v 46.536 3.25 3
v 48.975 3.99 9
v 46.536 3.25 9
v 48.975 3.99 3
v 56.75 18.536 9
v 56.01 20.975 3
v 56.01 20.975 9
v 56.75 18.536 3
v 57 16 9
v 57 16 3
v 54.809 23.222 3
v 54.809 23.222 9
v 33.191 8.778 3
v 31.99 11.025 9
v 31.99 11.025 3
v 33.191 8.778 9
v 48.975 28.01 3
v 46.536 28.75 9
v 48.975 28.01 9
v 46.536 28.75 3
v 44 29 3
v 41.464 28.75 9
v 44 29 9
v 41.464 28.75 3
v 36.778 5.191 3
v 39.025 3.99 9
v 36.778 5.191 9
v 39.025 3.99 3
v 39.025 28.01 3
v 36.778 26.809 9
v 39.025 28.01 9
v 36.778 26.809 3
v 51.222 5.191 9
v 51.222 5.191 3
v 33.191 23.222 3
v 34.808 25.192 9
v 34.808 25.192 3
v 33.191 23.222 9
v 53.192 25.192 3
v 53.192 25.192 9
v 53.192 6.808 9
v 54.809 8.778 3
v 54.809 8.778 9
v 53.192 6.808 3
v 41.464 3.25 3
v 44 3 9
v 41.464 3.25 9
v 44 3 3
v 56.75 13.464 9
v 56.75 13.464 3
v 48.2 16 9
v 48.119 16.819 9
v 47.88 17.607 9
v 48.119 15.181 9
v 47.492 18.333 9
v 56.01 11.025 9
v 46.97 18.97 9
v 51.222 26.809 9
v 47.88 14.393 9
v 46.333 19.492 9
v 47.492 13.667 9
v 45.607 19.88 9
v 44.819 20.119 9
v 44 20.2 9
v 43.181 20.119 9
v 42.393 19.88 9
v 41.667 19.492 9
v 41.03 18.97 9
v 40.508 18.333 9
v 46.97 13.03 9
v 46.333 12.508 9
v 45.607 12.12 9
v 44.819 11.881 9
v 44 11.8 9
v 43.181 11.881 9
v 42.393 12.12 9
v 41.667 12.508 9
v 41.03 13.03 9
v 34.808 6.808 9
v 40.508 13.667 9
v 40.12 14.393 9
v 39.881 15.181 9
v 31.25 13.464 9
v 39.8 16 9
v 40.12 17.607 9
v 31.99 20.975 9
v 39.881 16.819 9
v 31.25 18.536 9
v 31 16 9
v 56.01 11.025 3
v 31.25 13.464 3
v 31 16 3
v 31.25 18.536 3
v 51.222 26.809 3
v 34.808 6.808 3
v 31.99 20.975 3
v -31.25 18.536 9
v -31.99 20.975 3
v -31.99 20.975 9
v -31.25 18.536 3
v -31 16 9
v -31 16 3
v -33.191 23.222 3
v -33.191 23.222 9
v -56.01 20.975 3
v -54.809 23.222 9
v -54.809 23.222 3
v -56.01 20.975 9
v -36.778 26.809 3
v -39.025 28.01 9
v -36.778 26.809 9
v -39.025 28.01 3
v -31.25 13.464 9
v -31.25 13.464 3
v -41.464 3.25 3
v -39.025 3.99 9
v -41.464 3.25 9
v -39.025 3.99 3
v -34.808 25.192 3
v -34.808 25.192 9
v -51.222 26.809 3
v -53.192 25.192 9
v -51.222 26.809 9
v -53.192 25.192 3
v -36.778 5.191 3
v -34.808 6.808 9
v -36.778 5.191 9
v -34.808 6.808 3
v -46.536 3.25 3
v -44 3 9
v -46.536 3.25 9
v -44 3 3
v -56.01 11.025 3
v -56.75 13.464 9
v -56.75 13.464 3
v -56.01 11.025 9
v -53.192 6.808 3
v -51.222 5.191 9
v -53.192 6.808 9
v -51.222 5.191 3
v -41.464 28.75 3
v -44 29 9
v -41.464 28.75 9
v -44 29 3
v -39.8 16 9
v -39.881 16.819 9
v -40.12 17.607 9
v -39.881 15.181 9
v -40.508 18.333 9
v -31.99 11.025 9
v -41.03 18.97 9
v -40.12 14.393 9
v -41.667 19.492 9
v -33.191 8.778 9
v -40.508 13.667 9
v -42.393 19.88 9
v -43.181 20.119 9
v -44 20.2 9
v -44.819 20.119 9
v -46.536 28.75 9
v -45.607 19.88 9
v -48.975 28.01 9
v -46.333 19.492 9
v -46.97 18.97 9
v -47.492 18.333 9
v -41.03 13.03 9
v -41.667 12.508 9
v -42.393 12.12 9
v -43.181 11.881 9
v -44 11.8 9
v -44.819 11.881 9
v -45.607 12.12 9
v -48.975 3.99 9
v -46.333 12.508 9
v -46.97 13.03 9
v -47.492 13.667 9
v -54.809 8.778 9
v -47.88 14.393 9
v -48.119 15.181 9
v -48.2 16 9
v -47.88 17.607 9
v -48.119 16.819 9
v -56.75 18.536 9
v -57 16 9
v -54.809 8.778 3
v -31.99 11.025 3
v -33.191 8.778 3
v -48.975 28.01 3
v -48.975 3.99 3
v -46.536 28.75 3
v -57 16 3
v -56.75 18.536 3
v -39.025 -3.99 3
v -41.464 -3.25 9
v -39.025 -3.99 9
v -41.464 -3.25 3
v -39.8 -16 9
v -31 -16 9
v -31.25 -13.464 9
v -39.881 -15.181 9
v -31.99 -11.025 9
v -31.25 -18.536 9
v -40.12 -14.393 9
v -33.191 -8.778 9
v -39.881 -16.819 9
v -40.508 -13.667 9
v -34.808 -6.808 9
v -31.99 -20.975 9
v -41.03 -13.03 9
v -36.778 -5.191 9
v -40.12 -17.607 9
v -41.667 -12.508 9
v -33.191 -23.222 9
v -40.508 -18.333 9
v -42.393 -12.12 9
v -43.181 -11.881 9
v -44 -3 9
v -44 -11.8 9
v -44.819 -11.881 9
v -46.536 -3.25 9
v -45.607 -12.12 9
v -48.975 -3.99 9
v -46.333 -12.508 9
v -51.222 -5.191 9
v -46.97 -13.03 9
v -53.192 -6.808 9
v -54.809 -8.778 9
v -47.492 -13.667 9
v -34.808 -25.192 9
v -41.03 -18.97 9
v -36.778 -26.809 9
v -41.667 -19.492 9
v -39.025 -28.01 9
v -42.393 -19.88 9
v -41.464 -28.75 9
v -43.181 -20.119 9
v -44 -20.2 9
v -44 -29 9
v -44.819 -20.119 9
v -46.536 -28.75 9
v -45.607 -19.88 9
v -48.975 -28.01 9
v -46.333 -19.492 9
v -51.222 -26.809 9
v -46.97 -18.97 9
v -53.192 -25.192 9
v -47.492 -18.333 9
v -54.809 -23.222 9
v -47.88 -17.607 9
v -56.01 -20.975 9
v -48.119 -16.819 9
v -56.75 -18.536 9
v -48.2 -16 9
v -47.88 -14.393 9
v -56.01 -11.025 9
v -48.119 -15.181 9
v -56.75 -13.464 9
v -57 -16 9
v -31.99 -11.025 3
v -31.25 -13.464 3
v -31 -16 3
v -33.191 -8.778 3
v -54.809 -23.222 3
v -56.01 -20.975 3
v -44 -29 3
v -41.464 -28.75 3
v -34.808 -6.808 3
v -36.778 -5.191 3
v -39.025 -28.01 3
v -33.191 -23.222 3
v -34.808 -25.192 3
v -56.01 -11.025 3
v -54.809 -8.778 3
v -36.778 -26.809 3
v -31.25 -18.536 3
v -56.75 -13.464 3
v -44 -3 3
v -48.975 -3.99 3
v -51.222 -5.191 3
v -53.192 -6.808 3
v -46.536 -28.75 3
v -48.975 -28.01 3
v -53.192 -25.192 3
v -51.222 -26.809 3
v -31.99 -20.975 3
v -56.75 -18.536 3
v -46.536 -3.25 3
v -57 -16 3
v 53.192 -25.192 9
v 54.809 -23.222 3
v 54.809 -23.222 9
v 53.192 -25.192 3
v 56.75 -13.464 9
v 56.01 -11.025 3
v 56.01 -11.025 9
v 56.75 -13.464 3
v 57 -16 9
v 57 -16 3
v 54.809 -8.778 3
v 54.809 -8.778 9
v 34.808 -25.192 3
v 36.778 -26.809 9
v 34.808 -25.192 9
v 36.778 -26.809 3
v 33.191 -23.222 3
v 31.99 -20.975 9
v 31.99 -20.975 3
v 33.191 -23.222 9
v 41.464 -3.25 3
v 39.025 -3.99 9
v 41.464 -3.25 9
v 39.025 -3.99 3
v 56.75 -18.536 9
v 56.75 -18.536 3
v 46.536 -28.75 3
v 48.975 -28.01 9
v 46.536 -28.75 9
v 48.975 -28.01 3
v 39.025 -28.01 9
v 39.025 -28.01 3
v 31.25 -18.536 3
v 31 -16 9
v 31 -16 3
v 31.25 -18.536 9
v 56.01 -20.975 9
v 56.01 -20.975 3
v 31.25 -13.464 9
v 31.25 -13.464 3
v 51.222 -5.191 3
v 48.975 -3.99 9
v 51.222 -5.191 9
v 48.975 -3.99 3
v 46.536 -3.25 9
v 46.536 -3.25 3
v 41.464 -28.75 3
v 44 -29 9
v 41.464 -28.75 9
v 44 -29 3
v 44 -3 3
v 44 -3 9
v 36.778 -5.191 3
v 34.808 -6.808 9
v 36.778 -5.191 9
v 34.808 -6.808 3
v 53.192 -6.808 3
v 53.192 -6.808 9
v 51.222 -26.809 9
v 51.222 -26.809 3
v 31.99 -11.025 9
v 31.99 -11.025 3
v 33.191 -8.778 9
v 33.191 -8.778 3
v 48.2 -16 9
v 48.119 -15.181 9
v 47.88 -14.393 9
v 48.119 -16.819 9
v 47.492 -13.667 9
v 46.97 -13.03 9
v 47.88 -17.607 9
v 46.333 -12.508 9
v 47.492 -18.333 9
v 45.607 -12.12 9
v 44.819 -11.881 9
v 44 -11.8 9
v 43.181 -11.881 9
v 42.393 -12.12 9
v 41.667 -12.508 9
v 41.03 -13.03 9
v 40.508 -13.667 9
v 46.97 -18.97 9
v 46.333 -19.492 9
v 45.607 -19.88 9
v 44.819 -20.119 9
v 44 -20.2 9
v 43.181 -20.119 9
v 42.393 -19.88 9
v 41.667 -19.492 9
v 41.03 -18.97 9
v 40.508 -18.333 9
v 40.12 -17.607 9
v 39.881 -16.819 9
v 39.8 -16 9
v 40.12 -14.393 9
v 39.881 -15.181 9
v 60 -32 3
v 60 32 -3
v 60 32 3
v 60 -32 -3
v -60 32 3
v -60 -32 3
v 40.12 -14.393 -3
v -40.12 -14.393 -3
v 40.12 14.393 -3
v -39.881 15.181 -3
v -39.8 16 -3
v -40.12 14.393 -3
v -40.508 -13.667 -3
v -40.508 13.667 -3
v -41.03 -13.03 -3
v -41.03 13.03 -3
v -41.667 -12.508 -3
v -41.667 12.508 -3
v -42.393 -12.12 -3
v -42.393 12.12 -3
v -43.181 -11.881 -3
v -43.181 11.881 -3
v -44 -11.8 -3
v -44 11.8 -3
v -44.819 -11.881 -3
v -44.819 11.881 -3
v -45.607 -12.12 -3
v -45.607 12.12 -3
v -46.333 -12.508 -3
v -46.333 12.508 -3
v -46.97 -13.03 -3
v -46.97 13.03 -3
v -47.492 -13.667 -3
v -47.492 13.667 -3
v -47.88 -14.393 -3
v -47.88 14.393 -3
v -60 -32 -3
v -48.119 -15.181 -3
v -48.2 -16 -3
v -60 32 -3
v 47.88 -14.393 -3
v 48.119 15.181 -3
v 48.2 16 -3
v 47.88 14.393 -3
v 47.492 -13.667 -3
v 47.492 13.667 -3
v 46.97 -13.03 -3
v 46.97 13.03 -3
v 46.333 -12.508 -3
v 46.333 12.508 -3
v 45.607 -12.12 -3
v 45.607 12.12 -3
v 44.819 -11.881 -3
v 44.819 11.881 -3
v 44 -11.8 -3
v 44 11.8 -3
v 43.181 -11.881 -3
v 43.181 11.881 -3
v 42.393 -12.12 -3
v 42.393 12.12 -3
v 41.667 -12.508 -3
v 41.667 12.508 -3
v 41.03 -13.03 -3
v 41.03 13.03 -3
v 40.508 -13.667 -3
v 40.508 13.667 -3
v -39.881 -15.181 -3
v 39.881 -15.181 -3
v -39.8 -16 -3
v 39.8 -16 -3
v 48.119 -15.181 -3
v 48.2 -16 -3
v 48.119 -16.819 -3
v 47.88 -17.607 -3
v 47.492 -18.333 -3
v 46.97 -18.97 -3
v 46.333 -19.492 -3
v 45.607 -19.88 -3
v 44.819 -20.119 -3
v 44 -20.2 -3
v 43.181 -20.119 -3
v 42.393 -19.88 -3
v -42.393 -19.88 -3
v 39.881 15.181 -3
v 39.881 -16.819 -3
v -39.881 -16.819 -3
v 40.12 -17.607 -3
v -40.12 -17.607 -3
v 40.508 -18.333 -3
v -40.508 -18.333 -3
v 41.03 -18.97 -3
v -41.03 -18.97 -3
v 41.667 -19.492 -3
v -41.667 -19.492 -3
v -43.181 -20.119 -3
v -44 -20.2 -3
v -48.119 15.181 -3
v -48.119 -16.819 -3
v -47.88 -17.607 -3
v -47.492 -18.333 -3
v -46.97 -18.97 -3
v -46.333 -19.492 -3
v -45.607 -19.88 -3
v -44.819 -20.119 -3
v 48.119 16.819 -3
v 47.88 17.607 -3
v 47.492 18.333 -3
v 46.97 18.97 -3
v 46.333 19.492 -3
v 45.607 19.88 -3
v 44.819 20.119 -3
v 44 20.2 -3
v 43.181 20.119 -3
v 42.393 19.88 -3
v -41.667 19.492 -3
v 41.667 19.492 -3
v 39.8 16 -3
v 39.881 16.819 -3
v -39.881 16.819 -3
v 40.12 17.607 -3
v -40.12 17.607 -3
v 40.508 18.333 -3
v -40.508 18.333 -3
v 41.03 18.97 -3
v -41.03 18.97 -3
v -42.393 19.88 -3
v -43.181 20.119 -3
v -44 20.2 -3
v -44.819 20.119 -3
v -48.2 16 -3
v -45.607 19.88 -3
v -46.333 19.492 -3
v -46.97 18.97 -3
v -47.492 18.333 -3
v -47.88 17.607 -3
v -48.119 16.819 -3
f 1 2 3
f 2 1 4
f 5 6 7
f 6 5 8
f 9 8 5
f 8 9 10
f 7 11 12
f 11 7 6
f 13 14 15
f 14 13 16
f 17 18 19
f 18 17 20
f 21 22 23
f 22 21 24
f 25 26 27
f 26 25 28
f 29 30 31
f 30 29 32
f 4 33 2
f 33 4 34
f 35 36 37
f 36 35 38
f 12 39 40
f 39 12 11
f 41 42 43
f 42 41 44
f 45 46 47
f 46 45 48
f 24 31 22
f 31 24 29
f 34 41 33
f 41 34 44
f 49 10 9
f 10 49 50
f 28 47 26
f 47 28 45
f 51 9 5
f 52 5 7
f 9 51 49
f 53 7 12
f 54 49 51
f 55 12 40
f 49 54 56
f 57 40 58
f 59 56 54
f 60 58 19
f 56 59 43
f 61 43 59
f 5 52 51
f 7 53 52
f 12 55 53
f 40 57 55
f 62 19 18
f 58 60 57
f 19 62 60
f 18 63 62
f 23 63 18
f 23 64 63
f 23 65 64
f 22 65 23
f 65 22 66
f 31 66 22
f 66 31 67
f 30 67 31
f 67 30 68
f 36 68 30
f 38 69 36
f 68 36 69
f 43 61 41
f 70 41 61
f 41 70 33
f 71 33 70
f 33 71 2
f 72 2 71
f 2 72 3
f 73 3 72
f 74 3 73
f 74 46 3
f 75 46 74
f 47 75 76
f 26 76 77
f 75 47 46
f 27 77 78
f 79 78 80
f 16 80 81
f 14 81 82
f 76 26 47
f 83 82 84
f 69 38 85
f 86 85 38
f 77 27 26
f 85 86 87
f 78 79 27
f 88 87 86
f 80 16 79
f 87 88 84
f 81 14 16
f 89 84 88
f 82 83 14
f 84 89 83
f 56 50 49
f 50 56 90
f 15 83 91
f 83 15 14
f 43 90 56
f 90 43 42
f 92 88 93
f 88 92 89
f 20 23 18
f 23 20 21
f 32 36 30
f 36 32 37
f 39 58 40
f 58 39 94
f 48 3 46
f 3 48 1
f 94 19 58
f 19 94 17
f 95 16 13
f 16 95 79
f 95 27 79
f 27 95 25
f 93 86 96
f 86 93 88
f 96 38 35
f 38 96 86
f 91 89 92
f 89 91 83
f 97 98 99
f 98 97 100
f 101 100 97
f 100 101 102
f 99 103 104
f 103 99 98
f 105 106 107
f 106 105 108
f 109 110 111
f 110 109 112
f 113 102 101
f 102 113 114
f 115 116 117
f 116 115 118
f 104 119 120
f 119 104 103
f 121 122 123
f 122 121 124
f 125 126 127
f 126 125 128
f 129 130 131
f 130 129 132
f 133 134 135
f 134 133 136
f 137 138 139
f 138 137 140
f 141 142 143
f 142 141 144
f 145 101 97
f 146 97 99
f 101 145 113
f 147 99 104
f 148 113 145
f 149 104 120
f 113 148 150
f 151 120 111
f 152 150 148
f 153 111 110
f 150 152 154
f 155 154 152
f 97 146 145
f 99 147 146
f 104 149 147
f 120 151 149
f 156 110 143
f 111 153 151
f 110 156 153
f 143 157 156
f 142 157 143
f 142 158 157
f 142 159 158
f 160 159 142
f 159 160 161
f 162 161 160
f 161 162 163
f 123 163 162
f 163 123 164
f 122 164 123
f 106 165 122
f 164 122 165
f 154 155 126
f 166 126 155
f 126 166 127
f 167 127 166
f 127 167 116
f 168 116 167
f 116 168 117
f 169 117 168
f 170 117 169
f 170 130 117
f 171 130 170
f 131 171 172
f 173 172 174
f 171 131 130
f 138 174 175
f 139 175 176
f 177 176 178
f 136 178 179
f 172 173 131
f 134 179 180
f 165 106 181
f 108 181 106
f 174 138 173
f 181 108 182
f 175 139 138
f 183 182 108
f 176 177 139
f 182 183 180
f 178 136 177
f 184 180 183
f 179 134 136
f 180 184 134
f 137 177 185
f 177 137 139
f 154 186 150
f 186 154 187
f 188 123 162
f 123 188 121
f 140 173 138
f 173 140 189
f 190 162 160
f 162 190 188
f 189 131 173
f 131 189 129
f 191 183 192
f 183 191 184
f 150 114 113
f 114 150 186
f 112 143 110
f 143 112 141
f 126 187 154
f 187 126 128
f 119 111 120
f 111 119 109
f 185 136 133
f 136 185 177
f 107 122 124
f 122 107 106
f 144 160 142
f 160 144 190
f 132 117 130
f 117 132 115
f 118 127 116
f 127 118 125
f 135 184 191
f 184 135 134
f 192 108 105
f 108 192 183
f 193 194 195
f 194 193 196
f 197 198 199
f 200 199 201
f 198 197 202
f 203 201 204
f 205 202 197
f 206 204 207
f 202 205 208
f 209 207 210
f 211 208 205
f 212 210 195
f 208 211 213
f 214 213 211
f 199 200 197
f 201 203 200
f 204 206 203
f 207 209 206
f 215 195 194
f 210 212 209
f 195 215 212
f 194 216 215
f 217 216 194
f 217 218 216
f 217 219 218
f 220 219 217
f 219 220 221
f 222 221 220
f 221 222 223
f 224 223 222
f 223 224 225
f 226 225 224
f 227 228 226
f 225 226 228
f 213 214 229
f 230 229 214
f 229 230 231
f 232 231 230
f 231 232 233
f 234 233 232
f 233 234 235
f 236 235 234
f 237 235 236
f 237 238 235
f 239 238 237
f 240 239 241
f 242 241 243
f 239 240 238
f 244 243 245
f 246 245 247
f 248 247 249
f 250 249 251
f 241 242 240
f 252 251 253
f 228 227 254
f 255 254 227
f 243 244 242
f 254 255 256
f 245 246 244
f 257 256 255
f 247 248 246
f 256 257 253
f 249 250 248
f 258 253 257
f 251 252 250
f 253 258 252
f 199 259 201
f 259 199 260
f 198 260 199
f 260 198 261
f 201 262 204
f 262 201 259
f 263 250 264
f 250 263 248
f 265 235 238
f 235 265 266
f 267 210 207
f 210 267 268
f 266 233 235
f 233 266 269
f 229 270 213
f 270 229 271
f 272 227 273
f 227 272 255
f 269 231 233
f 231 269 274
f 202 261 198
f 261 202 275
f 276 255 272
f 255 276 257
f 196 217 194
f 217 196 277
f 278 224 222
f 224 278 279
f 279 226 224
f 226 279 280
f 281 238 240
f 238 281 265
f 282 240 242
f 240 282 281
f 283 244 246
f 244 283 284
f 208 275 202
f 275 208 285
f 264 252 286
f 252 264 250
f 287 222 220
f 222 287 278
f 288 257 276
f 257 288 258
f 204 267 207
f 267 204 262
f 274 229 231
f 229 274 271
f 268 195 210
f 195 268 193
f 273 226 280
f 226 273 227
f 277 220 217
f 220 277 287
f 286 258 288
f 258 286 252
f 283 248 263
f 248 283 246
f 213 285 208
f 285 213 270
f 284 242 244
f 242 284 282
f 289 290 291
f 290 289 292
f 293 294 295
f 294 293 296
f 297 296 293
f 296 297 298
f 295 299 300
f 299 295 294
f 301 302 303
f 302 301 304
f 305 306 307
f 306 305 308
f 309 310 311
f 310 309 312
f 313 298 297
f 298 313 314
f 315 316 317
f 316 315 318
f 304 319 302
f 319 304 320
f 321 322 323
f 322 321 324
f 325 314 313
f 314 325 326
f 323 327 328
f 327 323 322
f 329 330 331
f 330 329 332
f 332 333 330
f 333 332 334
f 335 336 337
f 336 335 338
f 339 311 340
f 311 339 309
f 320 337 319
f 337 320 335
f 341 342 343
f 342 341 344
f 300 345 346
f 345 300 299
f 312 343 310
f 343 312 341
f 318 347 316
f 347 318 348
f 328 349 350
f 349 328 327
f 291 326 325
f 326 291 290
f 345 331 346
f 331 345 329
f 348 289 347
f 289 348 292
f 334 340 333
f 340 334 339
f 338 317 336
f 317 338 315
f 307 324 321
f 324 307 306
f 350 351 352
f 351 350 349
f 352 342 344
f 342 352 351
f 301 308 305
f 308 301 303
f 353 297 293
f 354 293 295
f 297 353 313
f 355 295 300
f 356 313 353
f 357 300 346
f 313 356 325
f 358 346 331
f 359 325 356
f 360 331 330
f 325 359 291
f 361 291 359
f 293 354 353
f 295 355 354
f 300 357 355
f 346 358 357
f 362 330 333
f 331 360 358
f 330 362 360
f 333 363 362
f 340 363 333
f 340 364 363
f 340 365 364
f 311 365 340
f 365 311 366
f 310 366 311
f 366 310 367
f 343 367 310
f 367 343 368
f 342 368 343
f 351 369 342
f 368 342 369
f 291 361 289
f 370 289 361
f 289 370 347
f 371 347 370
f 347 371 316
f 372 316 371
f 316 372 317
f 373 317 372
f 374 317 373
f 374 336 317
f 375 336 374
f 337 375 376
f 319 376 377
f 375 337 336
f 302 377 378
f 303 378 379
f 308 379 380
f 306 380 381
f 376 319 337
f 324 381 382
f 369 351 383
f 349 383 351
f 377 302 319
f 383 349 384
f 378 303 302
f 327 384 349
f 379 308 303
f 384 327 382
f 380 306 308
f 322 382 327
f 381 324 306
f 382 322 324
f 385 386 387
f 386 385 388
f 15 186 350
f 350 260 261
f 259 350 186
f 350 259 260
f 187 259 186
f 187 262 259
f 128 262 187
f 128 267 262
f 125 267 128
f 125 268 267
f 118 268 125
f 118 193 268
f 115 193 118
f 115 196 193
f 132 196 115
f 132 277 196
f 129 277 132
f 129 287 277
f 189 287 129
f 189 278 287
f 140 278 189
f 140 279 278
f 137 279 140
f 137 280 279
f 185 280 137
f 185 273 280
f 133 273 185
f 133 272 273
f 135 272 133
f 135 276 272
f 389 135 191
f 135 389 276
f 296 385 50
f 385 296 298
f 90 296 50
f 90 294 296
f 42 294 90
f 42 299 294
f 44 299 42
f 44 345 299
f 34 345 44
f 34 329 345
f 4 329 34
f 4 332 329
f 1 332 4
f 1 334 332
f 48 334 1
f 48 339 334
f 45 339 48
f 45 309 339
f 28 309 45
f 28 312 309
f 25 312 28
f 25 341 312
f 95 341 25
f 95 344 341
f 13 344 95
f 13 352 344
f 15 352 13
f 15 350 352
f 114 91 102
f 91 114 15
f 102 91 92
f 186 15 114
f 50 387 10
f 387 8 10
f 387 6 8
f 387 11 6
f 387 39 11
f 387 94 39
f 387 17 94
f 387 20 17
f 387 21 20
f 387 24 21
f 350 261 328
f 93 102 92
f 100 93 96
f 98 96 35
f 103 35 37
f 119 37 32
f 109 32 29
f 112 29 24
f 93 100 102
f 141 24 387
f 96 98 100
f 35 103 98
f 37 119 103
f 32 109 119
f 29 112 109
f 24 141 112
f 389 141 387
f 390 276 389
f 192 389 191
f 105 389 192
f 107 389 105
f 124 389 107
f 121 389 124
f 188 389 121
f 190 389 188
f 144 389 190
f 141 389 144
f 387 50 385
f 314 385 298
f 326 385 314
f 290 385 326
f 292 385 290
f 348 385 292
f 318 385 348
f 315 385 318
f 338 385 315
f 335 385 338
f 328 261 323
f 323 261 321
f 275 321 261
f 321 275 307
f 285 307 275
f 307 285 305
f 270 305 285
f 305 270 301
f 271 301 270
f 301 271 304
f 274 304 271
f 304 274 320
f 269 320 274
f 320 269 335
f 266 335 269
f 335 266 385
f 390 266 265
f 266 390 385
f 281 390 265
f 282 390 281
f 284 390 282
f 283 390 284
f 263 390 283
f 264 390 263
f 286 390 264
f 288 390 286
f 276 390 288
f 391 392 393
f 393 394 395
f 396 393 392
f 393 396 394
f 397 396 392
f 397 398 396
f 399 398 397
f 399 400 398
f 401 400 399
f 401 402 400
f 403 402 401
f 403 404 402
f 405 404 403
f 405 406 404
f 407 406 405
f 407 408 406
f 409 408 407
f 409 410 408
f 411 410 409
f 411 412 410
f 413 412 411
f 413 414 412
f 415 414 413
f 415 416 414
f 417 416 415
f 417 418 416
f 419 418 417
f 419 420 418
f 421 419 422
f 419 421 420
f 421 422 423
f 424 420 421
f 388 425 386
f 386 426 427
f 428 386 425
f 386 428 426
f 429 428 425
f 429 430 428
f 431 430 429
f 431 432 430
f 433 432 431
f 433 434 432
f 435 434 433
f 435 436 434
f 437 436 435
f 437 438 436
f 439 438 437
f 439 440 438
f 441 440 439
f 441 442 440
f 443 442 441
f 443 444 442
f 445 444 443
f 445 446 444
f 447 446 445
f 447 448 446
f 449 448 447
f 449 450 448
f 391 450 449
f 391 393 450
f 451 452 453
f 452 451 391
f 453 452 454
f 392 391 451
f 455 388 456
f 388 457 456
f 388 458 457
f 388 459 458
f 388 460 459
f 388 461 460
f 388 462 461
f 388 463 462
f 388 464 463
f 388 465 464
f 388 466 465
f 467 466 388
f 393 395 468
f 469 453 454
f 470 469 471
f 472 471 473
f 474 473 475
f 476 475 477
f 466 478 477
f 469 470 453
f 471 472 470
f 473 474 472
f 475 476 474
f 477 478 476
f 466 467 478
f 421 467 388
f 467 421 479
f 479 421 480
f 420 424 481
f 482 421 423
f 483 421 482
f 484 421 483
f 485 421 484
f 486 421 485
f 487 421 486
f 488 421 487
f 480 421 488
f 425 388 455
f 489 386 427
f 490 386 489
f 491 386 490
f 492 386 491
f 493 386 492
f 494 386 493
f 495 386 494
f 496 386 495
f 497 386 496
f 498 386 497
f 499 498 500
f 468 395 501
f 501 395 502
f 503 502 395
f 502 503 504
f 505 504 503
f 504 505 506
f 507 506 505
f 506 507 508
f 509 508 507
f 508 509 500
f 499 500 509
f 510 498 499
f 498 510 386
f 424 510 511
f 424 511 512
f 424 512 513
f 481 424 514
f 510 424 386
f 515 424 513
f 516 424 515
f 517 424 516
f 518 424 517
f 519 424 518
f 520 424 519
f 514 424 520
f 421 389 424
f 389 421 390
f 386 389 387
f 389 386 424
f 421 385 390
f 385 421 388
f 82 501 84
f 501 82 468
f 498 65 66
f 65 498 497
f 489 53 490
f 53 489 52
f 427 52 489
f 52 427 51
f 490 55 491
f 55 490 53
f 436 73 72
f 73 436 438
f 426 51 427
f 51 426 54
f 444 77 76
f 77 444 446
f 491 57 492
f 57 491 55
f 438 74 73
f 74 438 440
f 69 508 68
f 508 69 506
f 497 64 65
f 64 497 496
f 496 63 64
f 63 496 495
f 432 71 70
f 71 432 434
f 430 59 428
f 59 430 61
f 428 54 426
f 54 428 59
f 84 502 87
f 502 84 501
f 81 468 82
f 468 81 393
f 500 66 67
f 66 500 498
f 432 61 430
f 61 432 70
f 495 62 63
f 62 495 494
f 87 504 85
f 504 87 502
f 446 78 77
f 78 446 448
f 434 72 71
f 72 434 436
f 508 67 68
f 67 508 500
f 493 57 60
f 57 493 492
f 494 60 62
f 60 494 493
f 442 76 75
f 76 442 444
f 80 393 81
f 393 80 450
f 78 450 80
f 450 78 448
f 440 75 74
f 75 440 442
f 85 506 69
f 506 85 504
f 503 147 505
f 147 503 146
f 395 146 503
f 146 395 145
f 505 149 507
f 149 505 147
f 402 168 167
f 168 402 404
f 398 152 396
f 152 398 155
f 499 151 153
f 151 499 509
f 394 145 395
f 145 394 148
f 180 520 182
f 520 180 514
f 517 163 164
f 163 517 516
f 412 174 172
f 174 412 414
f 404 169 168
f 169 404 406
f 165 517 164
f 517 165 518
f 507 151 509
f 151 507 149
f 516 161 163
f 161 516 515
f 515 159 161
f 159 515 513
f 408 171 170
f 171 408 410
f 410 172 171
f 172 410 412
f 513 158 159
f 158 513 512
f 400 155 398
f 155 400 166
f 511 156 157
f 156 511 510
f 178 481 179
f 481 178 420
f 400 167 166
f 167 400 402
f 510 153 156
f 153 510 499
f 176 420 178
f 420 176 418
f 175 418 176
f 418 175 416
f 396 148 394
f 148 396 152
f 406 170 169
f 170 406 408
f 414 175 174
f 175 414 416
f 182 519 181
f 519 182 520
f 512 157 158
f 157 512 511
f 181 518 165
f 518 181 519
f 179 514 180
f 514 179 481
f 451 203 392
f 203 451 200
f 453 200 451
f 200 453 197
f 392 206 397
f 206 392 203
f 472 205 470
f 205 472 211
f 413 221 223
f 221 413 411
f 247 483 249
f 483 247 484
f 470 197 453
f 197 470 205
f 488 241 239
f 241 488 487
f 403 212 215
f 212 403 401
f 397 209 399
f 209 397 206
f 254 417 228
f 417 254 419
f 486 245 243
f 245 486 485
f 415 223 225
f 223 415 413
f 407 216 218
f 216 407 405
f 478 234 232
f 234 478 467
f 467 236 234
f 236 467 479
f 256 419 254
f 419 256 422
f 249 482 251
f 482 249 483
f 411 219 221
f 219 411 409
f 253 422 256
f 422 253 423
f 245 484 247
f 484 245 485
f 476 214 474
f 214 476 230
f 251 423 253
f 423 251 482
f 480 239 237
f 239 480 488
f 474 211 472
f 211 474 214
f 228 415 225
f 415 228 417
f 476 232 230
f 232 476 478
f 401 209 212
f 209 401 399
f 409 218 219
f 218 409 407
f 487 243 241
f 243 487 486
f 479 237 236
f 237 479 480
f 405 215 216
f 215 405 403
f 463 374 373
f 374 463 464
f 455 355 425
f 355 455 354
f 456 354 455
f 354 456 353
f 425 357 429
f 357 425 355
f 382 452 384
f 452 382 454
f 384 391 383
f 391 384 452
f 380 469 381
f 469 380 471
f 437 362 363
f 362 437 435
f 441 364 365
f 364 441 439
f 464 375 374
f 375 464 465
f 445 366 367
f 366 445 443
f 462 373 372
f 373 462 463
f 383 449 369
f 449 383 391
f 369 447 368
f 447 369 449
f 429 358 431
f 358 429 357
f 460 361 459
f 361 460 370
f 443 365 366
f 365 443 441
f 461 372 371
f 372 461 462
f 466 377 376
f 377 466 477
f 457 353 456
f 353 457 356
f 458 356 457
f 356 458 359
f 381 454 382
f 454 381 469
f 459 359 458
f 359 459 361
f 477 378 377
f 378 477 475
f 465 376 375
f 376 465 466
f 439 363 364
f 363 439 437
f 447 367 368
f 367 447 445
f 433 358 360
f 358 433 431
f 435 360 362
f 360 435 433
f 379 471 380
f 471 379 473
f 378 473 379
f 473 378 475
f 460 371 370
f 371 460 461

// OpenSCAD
$fn = 32;

// ----------------------------------------------------------------------
// Anchor pads 120 x 64 x 12
// four corner bosses with anchor holes
// ----------------------------------------------------------------------

// --- parameters (mm) ---
plate = [120, 64, 6];  // base plate size (x, y, z)
pads = 4;              // boss count, one per corner
edge = 16;             // boss centre offset from the plate edge
boss_d = 26;           // boss diameter
boss_h = 6;            // boss height above the base plate
hole_d = 8.4;          // hole diameter

// --- derived feature positions (mm) ---
height = plate[2] + boss_h;      // = 12   overall height of the part
corner_x = plate[0] / 2 - edge;  // = 44   boss centre X
corner_y = plate[1] / 2 - edge;  // = 16   boss centre Y
feature_centers = [
  [corner_x, corner_y],
  [-corner_x, corner_y],
  [-corner_x, -corner_y],
  [corner_x, -corner_y]
];   // boss centres, anchor holes are drilled there

// base plate, four bosses standing on it, anchor holes all the way through
difference() {
  union() {
    cube(plate, center = true);
    for (centre = feature_centers)
      translate([centre[0], centre[1], plate[2] / 2 - 1])
        cylinder(d = boss_d, h = boss_h + 1);
  }
  for (centre = feature_centers)
    translate([centre[0], centre[1], -height])
      cylinder(d = hole_d, h = 2 * height + 2);  // through boss and plate
}
